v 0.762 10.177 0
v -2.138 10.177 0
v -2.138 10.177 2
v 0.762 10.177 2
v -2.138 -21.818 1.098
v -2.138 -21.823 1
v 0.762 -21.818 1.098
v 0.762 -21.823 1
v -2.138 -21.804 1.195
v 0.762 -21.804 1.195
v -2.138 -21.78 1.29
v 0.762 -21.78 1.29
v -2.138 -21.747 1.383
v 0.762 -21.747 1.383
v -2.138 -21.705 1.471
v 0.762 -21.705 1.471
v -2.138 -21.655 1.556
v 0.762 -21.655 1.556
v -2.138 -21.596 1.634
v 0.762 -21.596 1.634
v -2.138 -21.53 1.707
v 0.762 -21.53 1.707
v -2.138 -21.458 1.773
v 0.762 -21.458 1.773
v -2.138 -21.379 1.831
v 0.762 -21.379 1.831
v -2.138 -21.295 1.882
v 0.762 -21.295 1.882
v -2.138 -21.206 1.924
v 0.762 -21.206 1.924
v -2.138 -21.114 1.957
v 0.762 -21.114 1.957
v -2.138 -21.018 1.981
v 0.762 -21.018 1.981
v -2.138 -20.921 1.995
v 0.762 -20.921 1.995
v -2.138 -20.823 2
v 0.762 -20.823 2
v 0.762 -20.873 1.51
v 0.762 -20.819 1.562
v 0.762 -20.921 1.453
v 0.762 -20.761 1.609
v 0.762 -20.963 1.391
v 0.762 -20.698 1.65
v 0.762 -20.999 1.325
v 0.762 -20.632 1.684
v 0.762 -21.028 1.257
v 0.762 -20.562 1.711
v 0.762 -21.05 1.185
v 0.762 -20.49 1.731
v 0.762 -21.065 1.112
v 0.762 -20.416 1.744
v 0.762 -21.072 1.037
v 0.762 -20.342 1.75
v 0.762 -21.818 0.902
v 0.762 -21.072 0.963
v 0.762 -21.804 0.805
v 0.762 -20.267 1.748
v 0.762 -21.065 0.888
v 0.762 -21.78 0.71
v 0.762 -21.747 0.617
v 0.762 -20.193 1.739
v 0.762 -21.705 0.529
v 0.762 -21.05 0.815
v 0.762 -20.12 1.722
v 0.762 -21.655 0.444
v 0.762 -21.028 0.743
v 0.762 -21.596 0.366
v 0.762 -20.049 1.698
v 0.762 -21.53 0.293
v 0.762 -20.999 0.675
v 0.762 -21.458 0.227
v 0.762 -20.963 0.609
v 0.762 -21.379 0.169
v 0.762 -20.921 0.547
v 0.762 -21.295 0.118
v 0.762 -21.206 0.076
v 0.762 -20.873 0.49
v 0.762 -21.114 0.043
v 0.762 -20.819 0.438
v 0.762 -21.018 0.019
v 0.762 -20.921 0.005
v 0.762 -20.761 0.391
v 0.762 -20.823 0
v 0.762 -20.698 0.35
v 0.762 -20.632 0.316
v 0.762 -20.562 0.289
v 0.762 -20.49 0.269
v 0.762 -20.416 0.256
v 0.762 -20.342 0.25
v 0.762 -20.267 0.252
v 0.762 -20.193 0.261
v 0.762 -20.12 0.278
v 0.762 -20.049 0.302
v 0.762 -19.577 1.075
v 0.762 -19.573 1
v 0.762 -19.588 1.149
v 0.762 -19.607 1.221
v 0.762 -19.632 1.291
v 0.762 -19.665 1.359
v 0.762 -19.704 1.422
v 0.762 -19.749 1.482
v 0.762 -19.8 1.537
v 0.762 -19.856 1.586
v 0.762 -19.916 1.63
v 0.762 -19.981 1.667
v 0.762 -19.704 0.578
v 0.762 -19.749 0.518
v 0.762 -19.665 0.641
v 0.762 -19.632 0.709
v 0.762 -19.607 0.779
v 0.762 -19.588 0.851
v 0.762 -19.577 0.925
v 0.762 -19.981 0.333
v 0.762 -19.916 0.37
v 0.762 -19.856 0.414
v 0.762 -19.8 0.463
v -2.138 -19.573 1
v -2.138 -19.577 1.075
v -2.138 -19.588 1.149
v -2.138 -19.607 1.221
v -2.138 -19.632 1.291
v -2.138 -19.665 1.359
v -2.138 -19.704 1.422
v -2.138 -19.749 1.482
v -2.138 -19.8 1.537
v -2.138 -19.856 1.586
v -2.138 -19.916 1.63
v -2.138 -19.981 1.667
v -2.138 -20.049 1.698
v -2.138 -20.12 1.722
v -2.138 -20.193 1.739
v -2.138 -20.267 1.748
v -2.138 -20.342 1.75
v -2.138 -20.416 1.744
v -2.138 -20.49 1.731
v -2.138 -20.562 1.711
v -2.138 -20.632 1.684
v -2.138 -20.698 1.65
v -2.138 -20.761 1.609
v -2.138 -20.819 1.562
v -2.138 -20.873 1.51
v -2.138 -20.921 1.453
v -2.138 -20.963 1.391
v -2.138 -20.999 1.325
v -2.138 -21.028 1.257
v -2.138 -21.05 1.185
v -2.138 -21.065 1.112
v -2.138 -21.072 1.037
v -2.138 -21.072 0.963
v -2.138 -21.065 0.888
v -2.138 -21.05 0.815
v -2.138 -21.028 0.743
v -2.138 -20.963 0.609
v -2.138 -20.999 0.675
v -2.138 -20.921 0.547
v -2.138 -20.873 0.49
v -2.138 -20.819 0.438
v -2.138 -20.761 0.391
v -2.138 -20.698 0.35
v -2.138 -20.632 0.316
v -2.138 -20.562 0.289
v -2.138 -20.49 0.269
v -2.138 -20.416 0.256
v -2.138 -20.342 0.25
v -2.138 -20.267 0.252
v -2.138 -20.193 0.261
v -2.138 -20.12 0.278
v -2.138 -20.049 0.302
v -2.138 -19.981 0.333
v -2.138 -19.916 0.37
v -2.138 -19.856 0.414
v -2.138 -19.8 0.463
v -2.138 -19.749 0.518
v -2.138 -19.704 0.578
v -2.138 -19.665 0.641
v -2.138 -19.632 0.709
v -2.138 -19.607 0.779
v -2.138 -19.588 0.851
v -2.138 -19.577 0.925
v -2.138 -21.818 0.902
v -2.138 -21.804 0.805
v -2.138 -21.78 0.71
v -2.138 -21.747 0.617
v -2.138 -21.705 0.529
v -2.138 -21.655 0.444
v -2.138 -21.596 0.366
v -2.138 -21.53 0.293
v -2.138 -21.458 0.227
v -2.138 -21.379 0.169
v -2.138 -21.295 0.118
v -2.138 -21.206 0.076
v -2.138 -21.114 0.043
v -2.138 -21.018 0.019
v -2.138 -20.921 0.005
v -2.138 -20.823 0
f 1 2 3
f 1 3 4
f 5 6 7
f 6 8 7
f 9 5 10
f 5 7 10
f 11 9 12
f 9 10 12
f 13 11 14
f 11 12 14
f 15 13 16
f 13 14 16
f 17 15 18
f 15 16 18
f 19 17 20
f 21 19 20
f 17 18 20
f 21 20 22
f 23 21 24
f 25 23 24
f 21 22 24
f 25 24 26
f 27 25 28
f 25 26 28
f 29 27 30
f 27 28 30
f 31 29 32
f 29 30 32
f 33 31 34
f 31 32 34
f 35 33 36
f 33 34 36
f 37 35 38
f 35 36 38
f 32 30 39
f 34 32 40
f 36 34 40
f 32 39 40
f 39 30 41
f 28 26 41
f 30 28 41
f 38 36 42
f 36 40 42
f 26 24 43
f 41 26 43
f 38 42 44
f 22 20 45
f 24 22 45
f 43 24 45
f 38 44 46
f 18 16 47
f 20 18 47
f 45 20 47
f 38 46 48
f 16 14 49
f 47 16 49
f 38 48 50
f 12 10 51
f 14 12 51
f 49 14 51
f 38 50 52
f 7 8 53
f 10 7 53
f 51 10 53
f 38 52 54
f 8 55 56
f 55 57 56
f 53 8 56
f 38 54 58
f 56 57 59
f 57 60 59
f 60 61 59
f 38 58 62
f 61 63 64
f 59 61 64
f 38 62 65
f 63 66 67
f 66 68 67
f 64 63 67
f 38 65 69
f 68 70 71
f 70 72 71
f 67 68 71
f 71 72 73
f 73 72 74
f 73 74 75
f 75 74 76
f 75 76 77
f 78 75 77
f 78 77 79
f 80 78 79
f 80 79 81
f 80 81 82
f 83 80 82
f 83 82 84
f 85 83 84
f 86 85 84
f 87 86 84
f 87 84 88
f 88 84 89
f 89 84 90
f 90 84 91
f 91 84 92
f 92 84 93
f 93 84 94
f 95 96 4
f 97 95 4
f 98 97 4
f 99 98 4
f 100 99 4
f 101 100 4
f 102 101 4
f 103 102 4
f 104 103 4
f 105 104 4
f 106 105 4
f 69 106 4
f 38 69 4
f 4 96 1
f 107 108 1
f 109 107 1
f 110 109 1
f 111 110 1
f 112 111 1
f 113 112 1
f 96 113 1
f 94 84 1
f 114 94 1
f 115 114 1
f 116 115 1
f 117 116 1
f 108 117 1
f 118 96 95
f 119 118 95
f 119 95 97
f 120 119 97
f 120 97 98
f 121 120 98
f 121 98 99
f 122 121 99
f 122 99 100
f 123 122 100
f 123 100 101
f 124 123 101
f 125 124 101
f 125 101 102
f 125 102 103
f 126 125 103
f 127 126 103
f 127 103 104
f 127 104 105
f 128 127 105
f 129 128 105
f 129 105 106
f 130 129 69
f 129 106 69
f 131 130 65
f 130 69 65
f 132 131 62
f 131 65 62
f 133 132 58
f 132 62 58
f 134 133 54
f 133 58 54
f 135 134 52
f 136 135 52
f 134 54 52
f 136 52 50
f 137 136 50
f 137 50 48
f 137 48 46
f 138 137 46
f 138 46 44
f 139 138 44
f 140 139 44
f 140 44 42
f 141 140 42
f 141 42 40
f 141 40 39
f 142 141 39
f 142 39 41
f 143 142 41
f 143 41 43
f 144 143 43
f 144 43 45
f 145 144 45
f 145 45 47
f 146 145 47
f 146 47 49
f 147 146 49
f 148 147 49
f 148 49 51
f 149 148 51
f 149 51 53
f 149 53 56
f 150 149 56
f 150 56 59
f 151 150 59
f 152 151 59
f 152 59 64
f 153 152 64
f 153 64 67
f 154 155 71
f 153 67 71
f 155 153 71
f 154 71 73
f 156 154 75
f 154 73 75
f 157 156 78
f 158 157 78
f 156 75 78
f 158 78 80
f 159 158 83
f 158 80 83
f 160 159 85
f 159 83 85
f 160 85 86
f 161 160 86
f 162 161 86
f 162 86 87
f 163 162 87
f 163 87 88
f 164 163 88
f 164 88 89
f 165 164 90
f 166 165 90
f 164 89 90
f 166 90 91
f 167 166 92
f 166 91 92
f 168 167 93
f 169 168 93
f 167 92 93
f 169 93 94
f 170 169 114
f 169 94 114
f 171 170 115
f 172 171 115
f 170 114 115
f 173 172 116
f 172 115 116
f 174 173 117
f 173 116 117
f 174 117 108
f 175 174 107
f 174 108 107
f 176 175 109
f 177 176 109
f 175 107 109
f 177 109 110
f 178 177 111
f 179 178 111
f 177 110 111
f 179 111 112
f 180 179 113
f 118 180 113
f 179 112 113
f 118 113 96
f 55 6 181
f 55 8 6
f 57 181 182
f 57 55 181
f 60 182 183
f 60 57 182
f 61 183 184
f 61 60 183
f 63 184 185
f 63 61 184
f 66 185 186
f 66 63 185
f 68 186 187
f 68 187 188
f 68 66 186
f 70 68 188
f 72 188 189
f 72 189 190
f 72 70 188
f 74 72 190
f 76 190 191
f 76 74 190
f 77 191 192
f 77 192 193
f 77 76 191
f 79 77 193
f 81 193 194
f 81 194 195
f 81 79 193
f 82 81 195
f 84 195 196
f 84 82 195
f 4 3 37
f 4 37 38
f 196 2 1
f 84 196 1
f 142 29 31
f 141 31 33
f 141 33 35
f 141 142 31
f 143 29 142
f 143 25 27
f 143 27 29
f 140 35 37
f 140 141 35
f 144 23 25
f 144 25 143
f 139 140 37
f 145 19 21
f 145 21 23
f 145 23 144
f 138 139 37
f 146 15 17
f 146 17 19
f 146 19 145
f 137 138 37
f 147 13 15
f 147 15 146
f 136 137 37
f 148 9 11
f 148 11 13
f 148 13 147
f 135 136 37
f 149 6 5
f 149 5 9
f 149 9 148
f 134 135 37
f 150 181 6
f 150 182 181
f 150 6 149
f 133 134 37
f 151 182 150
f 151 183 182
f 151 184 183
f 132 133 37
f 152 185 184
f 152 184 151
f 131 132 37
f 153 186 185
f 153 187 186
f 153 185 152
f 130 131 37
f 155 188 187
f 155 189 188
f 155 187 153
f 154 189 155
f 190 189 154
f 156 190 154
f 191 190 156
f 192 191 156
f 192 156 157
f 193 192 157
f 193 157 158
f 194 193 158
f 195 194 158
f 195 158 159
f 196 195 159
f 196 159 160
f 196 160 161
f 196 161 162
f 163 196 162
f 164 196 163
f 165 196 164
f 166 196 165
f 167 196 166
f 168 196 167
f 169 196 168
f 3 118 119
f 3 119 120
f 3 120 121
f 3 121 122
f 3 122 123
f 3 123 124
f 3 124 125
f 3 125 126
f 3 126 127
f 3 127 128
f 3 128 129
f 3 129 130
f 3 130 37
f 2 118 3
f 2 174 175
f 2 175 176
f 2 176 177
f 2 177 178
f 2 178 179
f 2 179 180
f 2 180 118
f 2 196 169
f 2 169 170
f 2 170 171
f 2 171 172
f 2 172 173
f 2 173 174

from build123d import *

# Parameters (mm, degrees)
ESQUISSE1_W             = 2.9
ESQUISSE1_H             = 32
BOSS_EXTRU_1_DEPTH      = 2
CONG_1_R                = 1
ESQUISSE2_R             = 0.75
ENL_V_MAT_EXTRU_1_DEPTH = 3


with BuildPart() as part:
    # Esquisse1 → Boss.-Extru.1 (new body)
    with BuildSketch(Plane.XY):
        with Locations((-0.688215542, -5.823189522)):
            Rectangle(ESQUISSE1_W, ESQUISSE1_H)
    extrude(amount=BOSS_EXTRU_1_DEPTH)

    # Congé1
    cong_1_edges = [part.edges().sort_by_distance(p)[0] for p in [
        (-0.688215542, -21.823189522, 2),
        (-0.688215542, -21.823189522, 0),
    ]]
    fillet(cong_1_edges, radius=CONG_1_R - 0.0001)  # a hair under: the kernel refuses the full size

    # Esquisse2 → Enlèv. mat.-Extru.1 (cut)
    with BuildSketch(Plane(origin=(0.761784458, 0, 0), x_dir=(0, 0, -1), z_dir=(1, 0, 0))):
        with Locations(Location((-1, -20.323189522, 0), (0, 0, 90))):
            Circle(ESQUISSE2_R)
    extrude(amount=-ENL_V_MAT_EXTRU_1_DEPTH, mode=Mode.SUBTRACT)


solid = part.part
